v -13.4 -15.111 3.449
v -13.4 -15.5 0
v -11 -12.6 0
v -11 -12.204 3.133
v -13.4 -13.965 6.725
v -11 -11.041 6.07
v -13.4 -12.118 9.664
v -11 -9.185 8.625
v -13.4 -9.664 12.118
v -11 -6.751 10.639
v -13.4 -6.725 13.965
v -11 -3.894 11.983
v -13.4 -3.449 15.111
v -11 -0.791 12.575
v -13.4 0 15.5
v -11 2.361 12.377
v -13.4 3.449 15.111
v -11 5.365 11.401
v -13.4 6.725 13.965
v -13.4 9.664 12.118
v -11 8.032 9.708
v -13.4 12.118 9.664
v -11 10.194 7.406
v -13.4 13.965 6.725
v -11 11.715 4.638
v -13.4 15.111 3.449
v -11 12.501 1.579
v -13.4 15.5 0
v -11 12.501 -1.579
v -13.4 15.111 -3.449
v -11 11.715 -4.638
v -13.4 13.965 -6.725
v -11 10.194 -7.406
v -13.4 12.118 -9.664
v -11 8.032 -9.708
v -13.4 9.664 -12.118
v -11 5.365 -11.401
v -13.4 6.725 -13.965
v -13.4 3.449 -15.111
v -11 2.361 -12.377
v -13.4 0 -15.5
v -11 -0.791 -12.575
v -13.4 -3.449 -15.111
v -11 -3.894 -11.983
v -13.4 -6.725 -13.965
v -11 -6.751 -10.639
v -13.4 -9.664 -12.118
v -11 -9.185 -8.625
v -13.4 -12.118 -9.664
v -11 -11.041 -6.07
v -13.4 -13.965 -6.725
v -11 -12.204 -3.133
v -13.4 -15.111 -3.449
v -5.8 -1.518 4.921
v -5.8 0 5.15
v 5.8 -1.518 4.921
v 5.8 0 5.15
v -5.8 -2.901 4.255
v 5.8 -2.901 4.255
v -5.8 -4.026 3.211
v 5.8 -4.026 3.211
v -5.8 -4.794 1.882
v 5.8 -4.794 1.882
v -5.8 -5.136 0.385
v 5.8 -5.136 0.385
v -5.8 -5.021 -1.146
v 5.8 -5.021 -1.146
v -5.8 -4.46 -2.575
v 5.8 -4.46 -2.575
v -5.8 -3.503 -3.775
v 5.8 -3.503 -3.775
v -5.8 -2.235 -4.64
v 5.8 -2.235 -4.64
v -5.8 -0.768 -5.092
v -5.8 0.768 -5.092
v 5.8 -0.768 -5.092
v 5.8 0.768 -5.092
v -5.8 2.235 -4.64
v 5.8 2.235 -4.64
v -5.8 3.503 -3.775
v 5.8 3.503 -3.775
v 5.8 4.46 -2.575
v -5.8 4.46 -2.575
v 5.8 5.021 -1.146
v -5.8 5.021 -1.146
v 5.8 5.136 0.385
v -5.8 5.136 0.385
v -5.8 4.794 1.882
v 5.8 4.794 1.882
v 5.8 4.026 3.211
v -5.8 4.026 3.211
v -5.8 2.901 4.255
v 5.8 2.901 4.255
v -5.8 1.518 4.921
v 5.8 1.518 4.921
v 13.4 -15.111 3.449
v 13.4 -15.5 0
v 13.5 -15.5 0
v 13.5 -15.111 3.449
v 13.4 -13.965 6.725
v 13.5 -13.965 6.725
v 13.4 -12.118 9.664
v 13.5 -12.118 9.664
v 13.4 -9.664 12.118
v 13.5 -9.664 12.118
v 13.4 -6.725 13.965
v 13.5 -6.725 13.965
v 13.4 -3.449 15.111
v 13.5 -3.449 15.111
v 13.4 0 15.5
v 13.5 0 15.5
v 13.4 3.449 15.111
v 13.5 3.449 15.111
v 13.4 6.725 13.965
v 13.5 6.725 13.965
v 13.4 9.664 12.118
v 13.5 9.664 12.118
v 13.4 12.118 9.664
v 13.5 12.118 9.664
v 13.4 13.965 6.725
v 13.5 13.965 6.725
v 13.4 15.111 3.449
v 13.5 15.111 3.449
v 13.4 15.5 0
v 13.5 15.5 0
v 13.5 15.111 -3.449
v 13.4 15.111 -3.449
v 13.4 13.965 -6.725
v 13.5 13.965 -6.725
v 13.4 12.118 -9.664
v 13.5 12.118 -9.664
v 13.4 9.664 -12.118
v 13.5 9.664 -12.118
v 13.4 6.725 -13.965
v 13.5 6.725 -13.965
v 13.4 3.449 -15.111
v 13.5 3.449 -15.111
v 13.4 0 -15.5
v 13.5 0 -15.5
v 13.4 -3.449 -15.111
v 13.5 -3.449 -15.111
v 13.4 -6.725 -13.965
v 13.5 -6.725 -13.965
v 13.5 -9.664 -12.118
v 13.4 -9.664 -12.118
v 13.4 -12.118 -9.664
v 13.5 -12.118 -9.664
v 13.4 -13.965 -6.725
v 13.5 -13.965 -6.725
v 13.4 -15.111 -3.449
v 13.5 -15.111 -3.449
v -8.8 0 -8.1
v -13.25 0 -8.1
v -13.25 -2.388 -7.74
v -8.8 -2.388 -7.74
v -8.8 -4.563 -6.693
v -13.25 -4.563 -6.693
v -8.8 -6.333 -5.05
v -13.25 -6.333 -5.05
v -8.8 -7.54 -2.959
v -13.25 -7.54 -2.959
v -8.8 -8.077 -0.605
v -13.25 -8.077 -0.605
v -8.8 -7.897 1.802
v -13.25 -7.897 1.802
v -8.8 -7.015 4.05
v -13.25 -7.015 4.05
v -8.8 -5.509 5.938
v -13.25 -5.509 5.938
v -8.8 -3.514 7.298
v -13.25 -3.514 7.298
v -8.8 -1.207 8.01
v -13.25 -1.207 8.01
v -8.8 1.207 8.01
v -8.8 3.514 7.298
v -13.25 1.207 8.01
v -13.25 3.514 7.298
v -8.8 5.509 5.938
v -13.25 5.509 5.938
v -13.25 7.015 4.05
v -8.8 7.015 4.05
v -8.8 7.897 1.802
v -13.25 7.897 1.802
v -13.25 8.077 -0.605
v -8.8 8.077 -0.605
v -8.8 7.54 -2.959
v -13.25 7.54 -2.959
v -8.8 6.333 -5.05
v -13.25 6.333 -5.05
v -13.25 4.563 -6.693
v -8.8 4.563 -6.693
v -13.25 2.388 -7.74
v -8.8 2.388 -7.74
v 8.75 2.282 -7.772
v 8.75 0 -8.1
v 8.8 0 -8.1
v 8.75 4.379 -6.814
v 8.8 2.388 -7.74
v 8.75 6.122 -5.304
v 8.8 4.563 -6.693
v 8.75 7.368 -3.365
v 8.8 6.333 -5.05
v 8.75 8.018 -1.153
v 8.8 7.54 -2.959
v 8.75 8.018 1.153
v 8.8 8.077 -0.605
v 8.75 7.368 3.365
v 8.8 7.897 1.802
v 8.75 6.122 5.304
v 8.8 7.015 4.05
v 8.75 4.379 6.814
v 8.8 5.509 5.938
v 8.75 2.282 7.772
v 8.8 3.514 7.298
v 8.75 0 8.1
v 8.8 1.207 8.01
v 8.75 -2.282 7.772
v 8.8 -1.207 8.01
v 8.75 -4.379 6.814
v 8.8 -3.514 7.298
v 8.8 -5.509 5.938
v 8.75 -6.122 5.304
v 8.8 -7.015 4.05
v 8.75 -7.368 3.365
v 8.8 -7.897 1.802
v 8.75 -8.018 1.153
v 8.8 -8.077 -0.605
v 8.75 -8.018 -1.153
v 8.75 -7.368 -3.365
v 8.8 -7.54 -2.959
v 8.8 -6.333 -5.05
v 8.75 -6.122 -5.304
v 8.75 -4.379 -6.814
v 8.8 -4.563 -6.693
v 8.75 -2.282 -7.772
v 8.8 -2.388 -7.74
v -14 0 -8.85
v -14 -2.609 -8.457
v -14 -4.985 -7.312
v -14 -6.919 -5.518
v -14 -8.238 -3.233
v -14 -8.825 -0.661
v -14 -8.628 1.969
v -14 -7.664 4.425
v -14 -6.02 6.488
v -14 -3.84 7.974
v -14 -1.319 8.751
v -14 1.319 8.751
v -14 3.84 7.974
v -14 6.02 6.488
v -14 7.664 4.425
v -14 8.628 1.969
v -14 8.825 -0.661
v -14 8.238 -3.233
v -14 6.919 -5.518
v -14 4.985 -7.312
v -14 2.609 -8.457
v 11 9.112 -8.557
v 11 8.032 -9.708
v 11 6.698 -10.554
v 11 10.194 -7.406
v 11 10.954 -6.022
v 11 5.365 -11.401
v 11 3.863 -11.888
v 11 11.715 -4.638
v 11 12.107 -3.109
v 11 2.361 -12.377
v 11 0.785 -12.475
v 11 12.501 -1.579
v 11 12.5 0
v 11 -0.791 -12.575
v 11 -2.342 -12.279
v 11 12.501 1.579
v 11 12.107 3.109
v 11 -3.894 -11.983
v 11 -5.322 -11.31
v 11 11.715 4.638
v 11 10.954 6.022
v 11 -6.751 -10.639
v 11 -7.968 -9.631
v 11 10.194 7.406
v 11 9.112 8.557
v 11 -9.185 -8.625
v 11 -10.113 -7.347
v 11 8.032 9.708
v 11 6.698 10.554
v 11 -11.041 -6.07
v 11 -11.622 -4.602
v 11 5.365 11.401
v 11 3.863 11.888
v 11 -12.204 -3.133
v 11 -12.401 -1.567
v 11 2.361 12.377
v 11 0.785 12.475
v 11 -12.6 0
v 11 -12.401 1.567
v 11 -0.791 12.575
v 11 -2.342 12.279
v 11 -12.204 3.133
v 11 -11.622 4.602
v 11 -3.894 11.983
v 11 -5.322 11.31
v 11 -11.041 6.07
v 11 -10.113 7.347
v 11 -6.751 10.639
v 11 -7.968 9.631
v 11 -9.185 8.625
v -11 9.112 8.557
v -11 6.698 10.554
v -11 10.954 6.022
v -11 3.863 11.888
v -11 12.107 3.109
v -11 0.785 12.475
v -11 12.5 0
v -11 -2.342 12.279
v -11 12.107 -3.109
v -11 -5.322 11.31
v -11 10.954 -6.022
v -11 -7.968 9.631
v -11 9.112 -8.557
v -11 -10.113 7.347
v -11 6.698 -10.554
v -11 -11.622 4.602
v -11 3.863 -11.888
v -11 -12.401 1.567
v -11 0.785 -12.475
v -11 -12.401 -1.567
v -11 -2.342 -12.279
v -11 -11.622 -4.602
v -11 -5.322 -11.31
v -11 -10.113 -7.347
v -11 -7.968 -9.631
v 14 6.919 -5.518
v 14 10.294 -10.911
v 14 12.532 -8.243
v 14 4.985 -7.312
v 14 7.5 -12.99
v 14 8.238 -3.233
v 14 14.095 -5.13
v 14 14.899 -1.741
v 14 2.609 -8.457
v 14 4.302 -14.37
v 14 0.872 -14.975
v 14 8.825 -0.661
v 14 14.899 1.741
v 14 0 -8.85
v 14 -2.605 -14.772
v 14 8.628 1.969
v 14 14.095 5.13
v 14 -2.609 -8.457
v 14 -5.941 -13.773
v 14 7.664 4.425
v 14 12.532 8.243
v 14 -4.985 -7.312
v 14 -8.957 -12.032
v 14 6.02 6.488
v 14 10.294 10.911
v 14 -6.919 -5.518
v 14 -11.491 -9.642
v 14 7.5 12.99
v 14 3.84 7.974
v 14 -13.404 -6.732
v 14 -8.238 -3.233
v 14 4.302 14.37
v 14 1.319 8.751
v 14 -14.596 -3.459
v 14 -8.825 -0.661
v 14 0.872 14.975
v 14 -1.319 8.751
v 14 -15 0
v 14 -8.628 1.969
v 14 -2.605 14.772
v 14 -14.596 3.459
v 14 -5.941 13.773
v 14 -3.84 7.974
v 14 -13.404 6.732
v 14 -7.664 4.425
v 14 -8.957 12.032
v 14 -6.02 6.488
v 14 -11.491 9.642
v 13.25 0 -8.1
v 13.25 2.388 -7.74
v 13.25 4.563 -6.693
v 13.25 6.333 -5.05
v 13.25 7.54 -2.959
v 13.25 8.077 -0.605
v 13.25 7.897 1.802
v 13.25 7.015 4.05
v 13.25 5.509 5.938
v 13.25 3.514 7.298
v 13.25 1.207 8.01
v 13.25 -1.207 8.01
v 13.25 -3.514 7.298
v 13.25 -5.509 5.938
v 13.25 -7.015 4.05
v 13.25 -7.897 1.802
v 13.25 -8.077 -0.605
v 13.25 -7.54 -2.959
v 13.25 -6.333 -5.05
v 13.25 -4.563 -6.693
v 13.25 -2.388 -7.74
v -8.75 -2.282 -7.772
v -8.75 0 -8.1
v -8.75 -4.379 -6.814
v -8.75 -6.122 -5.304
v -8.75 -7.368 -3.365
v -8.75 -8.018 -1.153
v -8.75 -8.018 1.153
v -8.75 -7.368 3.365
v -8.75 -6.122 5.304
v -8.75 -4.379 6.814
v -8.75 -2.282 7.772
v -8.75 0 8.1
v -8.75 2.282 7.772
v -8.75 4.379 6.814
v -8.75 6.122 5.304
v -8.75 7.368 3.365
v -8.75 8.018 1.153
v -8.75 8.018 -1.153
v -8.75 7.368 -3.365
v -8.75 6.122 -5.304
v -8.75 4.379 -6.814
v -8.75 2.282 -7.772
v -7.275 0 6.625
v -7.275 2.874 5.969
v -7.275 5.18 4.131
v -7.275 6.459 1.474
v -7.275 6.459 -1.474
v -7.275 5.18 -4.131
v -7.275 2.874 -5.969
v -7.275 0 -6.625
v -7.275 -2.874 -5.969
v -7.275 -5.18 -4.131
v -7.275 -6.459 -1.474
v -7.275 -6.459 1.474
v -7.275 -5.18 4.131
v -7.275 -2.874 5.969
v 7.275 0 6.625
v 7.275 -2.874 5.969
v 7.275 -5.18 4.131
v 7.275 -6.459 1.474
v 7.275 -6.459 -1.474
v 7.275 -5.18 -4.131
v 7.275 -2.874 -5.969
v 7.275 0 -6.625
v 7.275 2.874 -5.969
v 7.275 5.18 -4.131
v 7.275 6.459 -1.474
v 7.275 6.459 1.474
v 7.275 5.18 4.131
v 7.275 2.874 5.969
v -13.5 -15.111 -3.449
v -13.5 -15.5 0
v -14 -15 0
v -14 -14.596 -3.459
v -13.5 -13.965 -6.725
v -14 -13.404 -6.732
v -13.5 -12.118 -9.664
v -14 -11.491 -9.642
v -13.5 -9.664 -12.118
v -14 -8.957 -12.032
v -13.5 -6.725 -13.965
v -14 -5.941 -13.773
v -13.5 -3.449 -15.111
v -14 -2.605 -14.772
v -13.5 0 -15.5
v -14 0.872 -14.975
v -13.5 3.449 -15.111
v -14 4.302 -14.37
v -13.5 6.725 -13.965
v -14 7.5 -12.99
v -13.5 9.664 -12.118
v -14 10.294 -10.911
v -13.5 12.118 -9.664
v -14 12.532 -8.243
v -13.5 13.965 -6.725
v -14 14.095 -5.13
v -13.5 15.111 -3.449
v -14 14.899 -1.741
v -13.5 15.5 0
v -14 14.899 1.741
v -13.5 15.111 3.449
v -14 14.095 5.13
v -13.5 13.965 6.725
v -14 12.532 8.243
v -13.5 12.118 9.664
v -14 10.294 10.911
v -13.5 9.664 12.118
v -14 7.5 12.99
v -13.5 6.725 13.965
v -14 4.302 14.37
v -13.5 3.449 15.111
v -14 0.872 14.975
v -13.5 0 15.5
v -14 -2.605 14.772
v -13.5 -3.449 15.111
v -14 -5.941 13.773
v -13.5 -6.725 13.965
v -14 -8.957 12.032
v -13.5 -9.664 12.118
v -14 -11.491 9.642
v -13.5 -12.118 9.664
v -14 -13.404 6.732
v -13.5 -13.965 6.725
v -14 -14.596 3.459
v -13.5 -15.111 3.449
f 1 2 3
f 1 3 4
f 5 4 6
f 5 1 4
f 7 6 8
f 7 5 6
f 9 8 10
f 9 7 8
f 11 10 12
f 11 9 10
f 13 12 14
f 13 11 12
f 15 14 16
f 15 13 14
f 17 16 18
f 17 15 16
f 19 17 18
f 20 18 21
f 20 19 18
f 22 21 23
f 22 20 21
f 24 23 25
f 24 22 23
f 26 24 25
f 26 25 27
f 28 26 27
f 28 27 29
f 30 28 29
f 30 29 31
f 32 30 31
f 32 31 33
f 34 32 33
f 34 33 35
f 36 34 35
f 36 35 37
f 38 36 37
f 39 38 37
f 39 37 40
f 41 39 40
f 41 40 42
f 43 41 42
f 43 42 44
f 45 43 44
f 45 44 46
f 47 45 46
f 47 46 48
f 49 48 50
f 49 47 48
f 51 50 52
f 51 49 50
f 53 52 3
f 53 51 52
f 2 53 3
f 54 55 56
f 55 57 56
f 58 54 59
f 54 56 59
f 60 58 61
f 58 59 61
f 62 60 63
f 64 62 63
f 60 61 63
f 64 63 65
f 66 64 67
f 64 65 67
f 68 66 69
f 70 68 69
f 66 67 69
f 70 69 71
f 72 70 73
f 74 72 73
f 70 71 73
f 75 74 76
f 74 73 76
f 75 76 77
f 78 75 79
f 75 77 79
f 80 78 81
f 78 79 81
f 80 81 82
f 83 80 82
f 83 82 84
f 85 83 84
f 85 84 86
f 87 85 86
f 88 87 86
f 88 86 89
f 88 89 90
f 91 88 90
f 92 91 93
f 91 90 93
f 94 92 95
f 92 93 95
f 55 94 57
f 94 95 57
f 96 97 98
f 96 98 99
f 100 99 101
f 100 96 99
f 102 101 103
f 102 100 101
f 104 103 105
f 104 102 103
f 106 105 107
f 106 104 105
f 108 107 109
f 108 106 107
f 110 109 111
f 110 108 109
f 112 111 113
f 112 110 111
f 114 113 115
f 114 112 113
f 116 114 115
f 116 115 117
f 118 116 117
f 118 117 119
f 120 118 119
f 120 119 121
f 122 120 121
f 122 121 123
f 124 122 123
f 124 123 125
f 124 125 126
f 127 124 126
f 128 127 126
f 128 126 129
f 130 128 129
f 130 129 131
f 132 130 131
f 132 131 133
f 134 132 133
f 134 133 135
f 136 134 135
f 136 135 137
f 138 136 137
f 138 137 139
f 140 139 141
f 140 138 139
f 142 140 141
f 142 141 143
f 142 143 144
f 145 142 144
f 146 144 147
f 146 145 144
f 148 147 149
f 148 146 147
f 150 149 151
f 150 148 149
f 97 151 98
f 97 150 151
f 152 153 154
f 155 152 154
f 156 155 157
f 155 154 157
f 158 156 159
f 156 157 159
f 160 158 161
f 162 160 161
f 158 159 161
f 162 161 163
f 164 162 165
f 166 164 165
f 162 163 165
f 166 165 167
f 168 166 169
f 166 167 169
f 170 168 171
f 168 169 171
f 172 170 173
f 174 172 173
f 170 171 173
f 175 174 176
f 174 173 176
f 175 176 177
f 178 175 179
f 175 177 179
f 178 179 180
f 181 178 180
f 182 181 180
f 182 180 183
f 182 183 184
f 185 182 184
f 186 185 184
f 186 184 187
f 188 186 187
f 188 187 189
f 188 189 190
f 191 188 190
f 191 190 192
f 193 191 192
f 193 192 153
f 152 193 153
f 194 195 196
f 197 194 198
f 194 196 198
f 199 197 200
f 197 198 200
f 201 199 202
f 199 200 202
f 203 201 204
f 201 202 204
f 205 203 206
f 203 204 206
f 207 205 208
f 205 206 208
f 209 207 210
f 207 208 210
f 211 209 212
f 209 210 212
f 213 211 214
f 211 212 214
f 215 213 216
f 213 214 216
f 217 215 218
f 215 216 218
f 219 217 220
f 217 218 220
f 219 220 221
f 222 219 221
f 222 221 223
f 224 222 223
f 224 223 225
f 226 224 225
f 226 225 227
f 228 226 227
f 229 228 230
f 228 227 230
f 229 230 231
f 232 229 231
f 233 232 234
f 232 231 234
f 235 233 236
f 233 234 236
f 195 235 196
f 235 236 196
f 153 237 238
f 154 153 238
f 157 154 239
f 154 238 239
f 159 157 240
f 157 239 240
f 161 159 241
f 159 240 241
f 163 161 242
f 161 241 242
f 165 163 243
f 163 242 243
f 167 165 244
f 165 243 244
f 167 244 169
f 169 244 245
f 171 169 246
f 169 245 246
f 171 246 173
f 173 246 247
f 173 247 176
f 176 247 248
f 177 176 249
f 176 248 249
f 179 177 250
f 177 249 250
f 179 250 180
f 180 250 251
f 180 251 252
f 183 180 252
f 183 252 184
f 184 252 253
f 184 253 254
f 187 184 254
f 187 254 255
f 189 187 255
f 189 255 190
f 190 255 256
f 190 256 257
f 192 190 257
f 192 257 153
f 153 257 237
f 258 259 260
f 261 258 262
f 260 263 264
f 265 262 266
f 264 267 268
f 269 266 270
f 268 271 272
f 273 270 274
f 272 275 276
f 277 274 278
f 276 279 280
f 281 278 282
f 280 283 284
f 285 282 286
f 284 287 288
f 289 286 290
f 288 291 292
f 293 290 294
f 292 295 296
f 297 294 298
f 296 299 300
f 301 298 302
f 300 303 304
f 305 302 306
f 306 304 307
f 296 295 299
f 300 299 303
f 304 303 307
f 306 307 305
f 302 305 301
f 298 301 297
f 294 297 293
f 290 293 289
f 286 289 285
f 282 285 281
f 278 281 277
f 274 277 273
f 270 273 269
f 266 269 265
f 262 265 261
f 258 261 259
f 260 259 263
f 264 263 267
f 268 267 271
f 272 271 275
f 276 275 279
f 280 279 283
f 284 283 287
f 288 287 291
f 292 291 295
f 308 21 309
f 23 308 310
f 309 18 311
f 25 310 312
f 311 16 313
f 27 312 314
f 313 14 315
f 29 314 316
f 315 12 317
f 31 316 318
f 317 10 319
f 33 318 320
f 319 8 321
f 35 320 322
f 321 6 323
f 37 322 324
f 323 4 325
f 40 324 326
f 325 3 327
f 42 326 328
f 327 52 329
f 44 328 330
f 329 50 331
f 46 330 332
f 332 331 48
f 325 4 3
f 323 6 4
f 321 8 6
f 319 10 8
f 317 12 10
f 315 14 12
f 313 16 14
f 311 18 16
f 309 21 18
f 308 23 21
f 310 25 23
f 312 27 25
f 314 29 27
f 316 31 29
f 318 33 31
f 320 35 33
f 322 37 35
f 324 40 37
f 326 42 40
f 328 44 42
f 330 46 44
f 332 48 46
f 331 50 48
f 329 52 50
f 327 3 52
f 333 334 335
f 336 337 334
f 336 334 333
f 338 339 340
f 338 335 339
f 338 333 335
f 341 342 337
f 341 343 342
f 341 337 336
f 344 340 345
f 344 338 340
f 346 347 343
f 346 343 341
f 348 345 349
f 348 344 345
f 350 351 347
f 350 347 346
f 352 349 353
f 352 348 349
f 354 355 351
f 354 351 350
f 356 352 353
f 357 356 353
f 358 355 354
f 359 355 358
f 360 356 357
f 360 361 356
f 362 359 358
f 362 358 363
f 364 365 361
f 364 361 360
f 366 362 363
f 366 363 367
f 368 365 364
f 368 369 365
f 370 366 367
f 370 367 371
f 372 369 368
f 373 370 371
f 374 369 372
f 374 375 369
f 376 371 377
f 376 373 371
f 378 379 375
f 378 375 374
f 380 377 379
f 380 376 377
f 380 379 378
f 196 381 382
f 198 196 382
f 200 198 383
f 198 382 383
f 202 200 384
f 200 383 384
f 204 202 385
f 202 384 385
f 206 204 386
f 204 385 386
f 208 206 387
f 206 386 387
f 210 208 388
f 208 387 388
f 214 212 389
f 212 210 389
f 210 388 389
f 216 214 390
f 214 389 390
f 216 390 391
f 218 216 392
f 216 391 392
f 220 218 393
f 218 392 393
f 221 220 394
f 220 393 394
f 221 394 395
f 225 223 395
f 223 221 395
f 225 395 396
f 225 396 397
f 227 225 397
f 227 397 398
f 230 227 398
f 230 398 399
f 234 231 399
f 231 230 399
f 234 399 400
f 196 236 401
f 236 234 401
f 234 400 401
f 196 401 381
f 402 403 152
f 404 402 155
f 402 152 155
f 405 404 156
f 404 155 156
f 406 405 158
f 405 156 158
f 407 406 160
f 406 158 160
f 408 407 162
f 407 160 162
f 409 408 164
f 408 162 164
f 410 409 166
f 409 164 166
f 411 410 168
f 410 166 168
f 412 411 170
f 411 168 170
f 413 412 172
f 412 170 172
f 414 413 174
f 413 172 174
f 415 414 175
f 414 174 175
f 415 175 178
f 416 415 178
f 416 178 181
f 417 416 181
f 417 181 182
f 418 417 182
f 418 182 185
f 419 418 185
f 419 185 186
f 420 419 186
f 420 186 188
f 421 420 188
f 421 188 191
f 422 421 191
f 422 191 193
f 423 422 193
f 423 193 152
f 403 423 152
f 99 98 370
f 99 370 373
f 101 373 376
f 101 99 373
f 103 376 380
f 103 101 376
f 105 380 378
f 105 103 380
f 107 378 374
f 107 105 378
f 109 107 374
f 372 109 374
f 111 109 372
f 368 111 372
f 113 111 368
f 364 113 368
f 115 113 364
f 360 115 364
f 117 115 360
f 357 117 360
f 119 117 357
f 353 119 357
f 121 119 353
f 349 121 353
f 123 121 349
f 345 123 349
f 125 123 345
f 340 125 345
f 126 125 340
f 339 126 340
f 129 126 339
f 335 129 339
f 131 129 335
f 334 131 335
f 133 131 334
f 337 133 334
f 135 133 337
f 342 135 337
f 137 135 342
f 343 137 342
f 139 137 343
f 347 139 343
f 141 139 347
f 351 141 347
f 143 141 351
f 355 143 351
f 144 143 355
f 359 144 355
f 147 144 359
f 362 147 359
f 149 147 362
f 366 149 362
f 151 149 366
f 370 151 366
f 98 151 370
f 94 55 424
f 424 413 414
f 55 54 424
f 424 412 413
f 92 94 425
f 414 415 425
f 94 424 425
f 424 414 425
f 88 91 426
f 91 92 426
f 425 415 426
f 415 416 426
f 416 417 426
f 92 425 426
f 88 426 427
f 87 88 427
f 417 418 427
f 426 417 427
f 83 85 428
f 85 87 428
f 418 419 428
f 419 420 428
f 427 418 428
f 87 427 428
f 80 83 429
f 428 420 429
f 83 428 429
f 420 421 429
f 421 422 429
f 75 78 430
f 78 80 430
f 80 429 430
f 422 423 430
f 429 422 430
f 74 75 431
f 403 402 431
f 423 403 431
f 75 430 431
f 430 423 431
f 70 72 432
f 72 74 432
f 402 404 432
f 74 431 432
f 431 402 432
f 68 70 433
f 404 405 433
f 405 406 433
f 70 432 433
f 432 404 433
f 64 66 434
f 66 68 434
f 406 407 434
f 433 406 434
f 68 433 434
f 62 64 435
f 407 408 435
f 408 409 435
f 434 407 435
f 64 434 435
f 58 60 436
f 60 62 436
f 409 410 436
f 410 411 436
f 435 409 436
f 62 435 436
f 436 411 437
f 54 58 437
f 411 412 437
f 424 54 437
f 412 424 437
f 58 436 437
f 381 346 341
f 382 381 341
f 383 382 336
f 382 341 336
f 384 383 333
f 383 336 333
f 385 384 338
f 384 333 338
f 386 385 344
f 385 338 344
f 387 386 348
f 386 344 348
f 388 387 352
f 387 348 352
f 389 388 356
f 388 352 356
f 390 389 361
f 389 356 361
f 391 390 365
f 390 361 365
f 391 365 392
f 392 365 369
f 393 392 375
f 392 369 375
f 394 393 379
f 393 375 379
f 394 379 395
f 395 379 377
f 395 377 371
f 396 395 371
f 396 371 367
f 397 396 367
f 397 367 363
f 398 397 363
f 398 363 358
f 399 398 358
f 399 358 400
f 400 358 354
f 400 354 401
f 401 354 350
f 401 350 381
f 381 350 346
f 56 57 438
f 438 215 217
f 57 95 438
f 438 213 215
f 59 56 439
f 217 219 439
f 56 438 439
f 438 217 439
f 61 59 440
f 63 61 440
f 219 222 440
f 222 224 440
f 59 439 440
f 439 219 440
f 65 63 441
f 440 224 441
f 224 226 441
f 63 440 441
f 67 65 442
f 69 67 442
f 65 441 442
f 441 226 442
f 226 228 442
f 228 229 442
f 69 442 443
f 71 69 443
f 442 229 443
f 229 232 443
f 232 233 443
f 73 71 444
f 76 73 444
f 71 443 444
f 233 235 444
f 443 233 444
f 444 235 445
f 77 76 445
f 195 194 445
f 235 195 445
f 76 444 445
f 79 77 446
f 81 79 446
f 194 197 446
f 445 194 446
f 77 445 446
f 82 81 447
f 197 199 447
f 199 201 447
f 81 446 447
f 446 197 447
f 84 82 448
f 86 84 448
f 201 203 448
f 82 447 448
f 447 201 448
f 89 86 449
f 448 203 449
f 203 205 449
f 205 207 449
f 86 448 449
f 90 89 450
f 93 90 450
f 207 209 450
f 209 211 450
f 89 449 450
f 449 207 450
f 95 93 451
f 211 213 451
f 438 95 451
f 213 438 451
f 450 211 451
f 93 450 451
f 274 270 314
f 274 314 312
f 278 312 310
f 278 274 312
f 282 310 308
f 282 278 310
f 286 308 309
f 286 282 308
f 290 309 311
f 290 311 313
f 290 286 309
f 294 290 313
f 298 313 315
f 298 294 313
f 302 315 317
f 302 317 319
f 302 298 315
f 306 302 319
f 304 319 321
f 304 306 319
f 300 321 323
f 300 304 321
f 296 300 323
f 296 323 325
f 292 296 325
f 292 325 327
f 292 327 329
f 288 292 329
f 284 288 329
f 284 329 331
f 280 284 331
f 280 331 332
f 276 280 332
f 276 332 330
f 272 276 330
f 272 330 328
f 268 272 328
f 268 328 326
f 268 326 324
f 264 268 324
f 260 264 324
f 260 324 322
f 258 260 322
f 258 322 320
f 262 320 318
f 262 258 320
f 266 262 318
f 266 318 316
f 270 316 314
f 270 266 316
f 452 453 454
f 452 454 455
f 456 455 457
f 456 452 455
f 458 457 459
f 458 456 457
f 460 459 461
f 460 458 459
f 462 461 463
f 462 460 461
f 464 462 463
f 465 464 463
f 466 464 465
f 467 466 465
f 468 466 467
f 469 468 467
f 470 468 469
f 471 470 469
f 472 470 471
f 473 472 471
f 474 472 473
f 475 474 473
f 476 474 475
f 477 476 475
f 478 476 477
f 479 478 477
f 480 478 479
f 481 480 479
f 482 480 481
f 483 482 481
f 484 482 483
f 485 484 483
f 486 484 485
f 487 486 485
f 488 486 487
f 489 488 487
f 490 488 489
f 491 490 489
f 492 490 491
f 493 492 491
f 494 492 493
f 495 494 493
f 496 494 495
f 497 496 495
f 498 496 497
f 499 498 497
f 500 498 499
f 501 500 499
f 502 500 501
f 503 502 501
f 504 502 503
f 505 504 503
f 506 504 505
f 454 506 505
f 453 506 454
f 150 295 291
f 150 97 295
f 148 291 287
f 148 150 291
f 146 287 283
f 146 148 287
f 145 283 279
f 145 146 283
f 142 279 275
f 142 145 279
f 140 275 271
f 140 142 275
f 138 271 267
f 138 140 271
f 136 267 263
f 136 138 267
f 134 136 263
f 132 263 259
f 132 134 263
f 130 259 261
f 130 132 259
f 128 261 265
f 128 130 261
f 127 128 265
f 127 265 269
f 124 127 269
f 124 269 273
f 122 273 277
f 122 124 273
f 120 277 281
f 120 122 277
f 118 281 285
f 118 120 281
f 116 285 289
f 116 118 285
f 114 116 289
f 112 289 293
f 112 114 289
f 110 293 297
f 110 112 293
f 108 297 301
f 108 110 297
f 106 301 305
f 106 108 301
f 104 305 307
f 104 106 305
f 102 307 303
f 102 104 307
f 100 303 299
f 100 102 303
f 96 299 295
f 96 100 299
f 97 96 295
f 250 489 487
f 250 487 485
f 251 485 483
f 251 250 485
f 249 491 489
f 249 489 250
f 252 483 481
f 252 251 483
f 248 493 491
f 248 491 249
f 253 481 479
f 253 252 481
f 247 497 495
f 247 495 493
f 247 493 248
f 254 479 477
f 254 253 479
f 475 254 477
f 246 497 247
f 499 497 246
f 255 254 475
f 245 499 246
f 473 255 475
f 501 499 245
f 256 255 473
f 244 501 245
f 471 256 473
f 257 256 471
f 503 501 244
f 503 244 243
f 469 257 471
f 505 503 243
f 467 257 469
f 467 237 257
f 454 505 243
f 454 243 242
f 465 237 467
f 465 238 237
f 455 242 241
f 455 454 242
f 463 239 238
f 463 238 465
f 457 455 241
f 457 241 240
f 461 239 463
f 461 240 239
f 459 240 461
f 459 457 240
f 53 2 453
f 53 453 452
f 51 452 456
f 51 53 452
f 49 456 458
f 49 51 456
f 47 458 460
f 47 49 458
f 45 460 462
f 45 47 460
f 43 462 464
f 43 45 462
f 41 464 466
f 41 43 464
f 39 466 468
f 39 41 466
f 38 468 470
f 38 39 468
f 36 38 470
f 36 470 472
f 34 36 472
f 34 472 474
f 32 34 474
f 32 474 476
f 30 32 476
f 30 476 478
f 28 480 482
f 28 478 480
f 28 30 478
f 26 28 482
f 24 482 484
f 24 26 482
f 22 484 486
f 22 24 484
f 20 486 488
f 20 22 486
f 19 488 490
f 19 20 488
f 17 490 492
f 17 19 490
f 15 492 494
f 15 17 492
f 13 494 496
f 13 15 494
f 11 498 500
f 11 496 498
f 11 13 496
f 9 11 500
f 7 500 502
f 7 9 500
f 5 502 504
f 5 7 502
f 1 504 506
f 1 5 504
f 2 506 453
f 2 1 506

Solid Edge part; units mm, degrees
sketch "Sketch1" plane through (0, 0, 0) normal (1, 0, 0) x (0, 1, 0)
  circle A0 centre (0, 0) radius 12.5
extrude "Extrusionsausprägung_15" add sketch "Sketch1" along normal mid plane 22
sketch "Sketch2" plane through (-11, 0, 0) normal (-1, 0, 0) x (0, -1, 0)
  circle A0 centre (0, 0) radius 15.5
extrude "Extrusionsausprägung_16" add sketch "Sketch2" along normal blind 3
chamfer "Fase_13" distance 2.9 distance2 2.4 1 edges at (-11, 15.5, 0) measured on face at (-11, 10.0233, 10.6433)
sketch "Sketch3" plane through (-14, 0, 0) normal (-1, 0, 0) x (0, 0, -1)
  circle A0 centre (0, 0) radius 8.1
extrude "Extrusionsausschnitt_23" cut sketch "Sketch3" against normal blind 5.2
chamfer "Fase_10" distance 0.75 angle 45 1 edges at (-14, 0, 8.1)
chamfer "Fase_11" distance 0.5 angle 45 1 edges at (-14, 15.5, 0)
mirror "Mirror1" about plane through (0, 0, 0) normal (1, 0, 0) of "Extrusionsausprägung_16", "Extrusionsausschnitt_23", "Fase_10", "Fase_11", "Fase_13"
sketch "Sketch4" plane through (8.8, 0, 0) normal (1, 0, 0) x (0, 0, 1)
  circle A0 centre (0, 0) radius 5.15
extrude "Extrusionsausschnitt_24" cut sketch "Sketch4" against normal blind 20
chamfer "Fase_12" distance 3 angle 45 2 edges at (8.8, 0, -5.15) (-8.8, -5.15, 0)
